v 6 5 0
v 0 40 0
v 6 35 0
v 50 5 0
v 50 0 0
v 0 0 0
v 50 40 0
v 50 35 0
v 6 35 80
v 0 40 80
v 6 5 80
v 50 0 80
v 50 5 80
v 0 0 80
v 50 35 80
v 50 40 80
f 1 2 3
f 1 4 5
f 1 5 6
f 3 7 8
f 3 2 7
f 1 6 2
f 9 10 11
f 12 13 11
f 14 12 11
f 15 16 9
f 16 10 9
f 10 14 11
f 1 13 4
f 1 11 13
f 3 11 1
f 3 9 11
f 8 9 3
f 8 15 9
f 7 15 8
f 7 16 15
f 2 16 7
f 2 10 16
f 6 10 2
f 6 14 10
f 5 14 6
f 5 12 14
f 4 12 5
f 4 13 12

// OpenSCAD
$fn = 32;

// ----------------------------------------------------------------------
// Structural section: channel 50 x 40 mm
// ----------------------------------------------------------------------

// --- parameters (mm) ---
sec_w = 50;               // channel width, X
sec_h = 40;               // channel height, Y
flange_t = 5;             // flange thickness
web_t = 6;                // web thickness
plate_t = 80;             // cut length, Z (extrusion height)
fit_tol = 0.05;           // declared fit tolerance (prompt contract)
free_tol = 0.3;           // declared free tolerance (prompt contract)

profile = [[0, 0], [50, 0], [50, 5], [6, 5], [6, 35], [50, 35], [50, 40], [0, 40]];  // primary outline, 8 points, counter clockwise

// --- the one profile operation ---
linear_extrude(height = plate_t) polygon(points = profile);
